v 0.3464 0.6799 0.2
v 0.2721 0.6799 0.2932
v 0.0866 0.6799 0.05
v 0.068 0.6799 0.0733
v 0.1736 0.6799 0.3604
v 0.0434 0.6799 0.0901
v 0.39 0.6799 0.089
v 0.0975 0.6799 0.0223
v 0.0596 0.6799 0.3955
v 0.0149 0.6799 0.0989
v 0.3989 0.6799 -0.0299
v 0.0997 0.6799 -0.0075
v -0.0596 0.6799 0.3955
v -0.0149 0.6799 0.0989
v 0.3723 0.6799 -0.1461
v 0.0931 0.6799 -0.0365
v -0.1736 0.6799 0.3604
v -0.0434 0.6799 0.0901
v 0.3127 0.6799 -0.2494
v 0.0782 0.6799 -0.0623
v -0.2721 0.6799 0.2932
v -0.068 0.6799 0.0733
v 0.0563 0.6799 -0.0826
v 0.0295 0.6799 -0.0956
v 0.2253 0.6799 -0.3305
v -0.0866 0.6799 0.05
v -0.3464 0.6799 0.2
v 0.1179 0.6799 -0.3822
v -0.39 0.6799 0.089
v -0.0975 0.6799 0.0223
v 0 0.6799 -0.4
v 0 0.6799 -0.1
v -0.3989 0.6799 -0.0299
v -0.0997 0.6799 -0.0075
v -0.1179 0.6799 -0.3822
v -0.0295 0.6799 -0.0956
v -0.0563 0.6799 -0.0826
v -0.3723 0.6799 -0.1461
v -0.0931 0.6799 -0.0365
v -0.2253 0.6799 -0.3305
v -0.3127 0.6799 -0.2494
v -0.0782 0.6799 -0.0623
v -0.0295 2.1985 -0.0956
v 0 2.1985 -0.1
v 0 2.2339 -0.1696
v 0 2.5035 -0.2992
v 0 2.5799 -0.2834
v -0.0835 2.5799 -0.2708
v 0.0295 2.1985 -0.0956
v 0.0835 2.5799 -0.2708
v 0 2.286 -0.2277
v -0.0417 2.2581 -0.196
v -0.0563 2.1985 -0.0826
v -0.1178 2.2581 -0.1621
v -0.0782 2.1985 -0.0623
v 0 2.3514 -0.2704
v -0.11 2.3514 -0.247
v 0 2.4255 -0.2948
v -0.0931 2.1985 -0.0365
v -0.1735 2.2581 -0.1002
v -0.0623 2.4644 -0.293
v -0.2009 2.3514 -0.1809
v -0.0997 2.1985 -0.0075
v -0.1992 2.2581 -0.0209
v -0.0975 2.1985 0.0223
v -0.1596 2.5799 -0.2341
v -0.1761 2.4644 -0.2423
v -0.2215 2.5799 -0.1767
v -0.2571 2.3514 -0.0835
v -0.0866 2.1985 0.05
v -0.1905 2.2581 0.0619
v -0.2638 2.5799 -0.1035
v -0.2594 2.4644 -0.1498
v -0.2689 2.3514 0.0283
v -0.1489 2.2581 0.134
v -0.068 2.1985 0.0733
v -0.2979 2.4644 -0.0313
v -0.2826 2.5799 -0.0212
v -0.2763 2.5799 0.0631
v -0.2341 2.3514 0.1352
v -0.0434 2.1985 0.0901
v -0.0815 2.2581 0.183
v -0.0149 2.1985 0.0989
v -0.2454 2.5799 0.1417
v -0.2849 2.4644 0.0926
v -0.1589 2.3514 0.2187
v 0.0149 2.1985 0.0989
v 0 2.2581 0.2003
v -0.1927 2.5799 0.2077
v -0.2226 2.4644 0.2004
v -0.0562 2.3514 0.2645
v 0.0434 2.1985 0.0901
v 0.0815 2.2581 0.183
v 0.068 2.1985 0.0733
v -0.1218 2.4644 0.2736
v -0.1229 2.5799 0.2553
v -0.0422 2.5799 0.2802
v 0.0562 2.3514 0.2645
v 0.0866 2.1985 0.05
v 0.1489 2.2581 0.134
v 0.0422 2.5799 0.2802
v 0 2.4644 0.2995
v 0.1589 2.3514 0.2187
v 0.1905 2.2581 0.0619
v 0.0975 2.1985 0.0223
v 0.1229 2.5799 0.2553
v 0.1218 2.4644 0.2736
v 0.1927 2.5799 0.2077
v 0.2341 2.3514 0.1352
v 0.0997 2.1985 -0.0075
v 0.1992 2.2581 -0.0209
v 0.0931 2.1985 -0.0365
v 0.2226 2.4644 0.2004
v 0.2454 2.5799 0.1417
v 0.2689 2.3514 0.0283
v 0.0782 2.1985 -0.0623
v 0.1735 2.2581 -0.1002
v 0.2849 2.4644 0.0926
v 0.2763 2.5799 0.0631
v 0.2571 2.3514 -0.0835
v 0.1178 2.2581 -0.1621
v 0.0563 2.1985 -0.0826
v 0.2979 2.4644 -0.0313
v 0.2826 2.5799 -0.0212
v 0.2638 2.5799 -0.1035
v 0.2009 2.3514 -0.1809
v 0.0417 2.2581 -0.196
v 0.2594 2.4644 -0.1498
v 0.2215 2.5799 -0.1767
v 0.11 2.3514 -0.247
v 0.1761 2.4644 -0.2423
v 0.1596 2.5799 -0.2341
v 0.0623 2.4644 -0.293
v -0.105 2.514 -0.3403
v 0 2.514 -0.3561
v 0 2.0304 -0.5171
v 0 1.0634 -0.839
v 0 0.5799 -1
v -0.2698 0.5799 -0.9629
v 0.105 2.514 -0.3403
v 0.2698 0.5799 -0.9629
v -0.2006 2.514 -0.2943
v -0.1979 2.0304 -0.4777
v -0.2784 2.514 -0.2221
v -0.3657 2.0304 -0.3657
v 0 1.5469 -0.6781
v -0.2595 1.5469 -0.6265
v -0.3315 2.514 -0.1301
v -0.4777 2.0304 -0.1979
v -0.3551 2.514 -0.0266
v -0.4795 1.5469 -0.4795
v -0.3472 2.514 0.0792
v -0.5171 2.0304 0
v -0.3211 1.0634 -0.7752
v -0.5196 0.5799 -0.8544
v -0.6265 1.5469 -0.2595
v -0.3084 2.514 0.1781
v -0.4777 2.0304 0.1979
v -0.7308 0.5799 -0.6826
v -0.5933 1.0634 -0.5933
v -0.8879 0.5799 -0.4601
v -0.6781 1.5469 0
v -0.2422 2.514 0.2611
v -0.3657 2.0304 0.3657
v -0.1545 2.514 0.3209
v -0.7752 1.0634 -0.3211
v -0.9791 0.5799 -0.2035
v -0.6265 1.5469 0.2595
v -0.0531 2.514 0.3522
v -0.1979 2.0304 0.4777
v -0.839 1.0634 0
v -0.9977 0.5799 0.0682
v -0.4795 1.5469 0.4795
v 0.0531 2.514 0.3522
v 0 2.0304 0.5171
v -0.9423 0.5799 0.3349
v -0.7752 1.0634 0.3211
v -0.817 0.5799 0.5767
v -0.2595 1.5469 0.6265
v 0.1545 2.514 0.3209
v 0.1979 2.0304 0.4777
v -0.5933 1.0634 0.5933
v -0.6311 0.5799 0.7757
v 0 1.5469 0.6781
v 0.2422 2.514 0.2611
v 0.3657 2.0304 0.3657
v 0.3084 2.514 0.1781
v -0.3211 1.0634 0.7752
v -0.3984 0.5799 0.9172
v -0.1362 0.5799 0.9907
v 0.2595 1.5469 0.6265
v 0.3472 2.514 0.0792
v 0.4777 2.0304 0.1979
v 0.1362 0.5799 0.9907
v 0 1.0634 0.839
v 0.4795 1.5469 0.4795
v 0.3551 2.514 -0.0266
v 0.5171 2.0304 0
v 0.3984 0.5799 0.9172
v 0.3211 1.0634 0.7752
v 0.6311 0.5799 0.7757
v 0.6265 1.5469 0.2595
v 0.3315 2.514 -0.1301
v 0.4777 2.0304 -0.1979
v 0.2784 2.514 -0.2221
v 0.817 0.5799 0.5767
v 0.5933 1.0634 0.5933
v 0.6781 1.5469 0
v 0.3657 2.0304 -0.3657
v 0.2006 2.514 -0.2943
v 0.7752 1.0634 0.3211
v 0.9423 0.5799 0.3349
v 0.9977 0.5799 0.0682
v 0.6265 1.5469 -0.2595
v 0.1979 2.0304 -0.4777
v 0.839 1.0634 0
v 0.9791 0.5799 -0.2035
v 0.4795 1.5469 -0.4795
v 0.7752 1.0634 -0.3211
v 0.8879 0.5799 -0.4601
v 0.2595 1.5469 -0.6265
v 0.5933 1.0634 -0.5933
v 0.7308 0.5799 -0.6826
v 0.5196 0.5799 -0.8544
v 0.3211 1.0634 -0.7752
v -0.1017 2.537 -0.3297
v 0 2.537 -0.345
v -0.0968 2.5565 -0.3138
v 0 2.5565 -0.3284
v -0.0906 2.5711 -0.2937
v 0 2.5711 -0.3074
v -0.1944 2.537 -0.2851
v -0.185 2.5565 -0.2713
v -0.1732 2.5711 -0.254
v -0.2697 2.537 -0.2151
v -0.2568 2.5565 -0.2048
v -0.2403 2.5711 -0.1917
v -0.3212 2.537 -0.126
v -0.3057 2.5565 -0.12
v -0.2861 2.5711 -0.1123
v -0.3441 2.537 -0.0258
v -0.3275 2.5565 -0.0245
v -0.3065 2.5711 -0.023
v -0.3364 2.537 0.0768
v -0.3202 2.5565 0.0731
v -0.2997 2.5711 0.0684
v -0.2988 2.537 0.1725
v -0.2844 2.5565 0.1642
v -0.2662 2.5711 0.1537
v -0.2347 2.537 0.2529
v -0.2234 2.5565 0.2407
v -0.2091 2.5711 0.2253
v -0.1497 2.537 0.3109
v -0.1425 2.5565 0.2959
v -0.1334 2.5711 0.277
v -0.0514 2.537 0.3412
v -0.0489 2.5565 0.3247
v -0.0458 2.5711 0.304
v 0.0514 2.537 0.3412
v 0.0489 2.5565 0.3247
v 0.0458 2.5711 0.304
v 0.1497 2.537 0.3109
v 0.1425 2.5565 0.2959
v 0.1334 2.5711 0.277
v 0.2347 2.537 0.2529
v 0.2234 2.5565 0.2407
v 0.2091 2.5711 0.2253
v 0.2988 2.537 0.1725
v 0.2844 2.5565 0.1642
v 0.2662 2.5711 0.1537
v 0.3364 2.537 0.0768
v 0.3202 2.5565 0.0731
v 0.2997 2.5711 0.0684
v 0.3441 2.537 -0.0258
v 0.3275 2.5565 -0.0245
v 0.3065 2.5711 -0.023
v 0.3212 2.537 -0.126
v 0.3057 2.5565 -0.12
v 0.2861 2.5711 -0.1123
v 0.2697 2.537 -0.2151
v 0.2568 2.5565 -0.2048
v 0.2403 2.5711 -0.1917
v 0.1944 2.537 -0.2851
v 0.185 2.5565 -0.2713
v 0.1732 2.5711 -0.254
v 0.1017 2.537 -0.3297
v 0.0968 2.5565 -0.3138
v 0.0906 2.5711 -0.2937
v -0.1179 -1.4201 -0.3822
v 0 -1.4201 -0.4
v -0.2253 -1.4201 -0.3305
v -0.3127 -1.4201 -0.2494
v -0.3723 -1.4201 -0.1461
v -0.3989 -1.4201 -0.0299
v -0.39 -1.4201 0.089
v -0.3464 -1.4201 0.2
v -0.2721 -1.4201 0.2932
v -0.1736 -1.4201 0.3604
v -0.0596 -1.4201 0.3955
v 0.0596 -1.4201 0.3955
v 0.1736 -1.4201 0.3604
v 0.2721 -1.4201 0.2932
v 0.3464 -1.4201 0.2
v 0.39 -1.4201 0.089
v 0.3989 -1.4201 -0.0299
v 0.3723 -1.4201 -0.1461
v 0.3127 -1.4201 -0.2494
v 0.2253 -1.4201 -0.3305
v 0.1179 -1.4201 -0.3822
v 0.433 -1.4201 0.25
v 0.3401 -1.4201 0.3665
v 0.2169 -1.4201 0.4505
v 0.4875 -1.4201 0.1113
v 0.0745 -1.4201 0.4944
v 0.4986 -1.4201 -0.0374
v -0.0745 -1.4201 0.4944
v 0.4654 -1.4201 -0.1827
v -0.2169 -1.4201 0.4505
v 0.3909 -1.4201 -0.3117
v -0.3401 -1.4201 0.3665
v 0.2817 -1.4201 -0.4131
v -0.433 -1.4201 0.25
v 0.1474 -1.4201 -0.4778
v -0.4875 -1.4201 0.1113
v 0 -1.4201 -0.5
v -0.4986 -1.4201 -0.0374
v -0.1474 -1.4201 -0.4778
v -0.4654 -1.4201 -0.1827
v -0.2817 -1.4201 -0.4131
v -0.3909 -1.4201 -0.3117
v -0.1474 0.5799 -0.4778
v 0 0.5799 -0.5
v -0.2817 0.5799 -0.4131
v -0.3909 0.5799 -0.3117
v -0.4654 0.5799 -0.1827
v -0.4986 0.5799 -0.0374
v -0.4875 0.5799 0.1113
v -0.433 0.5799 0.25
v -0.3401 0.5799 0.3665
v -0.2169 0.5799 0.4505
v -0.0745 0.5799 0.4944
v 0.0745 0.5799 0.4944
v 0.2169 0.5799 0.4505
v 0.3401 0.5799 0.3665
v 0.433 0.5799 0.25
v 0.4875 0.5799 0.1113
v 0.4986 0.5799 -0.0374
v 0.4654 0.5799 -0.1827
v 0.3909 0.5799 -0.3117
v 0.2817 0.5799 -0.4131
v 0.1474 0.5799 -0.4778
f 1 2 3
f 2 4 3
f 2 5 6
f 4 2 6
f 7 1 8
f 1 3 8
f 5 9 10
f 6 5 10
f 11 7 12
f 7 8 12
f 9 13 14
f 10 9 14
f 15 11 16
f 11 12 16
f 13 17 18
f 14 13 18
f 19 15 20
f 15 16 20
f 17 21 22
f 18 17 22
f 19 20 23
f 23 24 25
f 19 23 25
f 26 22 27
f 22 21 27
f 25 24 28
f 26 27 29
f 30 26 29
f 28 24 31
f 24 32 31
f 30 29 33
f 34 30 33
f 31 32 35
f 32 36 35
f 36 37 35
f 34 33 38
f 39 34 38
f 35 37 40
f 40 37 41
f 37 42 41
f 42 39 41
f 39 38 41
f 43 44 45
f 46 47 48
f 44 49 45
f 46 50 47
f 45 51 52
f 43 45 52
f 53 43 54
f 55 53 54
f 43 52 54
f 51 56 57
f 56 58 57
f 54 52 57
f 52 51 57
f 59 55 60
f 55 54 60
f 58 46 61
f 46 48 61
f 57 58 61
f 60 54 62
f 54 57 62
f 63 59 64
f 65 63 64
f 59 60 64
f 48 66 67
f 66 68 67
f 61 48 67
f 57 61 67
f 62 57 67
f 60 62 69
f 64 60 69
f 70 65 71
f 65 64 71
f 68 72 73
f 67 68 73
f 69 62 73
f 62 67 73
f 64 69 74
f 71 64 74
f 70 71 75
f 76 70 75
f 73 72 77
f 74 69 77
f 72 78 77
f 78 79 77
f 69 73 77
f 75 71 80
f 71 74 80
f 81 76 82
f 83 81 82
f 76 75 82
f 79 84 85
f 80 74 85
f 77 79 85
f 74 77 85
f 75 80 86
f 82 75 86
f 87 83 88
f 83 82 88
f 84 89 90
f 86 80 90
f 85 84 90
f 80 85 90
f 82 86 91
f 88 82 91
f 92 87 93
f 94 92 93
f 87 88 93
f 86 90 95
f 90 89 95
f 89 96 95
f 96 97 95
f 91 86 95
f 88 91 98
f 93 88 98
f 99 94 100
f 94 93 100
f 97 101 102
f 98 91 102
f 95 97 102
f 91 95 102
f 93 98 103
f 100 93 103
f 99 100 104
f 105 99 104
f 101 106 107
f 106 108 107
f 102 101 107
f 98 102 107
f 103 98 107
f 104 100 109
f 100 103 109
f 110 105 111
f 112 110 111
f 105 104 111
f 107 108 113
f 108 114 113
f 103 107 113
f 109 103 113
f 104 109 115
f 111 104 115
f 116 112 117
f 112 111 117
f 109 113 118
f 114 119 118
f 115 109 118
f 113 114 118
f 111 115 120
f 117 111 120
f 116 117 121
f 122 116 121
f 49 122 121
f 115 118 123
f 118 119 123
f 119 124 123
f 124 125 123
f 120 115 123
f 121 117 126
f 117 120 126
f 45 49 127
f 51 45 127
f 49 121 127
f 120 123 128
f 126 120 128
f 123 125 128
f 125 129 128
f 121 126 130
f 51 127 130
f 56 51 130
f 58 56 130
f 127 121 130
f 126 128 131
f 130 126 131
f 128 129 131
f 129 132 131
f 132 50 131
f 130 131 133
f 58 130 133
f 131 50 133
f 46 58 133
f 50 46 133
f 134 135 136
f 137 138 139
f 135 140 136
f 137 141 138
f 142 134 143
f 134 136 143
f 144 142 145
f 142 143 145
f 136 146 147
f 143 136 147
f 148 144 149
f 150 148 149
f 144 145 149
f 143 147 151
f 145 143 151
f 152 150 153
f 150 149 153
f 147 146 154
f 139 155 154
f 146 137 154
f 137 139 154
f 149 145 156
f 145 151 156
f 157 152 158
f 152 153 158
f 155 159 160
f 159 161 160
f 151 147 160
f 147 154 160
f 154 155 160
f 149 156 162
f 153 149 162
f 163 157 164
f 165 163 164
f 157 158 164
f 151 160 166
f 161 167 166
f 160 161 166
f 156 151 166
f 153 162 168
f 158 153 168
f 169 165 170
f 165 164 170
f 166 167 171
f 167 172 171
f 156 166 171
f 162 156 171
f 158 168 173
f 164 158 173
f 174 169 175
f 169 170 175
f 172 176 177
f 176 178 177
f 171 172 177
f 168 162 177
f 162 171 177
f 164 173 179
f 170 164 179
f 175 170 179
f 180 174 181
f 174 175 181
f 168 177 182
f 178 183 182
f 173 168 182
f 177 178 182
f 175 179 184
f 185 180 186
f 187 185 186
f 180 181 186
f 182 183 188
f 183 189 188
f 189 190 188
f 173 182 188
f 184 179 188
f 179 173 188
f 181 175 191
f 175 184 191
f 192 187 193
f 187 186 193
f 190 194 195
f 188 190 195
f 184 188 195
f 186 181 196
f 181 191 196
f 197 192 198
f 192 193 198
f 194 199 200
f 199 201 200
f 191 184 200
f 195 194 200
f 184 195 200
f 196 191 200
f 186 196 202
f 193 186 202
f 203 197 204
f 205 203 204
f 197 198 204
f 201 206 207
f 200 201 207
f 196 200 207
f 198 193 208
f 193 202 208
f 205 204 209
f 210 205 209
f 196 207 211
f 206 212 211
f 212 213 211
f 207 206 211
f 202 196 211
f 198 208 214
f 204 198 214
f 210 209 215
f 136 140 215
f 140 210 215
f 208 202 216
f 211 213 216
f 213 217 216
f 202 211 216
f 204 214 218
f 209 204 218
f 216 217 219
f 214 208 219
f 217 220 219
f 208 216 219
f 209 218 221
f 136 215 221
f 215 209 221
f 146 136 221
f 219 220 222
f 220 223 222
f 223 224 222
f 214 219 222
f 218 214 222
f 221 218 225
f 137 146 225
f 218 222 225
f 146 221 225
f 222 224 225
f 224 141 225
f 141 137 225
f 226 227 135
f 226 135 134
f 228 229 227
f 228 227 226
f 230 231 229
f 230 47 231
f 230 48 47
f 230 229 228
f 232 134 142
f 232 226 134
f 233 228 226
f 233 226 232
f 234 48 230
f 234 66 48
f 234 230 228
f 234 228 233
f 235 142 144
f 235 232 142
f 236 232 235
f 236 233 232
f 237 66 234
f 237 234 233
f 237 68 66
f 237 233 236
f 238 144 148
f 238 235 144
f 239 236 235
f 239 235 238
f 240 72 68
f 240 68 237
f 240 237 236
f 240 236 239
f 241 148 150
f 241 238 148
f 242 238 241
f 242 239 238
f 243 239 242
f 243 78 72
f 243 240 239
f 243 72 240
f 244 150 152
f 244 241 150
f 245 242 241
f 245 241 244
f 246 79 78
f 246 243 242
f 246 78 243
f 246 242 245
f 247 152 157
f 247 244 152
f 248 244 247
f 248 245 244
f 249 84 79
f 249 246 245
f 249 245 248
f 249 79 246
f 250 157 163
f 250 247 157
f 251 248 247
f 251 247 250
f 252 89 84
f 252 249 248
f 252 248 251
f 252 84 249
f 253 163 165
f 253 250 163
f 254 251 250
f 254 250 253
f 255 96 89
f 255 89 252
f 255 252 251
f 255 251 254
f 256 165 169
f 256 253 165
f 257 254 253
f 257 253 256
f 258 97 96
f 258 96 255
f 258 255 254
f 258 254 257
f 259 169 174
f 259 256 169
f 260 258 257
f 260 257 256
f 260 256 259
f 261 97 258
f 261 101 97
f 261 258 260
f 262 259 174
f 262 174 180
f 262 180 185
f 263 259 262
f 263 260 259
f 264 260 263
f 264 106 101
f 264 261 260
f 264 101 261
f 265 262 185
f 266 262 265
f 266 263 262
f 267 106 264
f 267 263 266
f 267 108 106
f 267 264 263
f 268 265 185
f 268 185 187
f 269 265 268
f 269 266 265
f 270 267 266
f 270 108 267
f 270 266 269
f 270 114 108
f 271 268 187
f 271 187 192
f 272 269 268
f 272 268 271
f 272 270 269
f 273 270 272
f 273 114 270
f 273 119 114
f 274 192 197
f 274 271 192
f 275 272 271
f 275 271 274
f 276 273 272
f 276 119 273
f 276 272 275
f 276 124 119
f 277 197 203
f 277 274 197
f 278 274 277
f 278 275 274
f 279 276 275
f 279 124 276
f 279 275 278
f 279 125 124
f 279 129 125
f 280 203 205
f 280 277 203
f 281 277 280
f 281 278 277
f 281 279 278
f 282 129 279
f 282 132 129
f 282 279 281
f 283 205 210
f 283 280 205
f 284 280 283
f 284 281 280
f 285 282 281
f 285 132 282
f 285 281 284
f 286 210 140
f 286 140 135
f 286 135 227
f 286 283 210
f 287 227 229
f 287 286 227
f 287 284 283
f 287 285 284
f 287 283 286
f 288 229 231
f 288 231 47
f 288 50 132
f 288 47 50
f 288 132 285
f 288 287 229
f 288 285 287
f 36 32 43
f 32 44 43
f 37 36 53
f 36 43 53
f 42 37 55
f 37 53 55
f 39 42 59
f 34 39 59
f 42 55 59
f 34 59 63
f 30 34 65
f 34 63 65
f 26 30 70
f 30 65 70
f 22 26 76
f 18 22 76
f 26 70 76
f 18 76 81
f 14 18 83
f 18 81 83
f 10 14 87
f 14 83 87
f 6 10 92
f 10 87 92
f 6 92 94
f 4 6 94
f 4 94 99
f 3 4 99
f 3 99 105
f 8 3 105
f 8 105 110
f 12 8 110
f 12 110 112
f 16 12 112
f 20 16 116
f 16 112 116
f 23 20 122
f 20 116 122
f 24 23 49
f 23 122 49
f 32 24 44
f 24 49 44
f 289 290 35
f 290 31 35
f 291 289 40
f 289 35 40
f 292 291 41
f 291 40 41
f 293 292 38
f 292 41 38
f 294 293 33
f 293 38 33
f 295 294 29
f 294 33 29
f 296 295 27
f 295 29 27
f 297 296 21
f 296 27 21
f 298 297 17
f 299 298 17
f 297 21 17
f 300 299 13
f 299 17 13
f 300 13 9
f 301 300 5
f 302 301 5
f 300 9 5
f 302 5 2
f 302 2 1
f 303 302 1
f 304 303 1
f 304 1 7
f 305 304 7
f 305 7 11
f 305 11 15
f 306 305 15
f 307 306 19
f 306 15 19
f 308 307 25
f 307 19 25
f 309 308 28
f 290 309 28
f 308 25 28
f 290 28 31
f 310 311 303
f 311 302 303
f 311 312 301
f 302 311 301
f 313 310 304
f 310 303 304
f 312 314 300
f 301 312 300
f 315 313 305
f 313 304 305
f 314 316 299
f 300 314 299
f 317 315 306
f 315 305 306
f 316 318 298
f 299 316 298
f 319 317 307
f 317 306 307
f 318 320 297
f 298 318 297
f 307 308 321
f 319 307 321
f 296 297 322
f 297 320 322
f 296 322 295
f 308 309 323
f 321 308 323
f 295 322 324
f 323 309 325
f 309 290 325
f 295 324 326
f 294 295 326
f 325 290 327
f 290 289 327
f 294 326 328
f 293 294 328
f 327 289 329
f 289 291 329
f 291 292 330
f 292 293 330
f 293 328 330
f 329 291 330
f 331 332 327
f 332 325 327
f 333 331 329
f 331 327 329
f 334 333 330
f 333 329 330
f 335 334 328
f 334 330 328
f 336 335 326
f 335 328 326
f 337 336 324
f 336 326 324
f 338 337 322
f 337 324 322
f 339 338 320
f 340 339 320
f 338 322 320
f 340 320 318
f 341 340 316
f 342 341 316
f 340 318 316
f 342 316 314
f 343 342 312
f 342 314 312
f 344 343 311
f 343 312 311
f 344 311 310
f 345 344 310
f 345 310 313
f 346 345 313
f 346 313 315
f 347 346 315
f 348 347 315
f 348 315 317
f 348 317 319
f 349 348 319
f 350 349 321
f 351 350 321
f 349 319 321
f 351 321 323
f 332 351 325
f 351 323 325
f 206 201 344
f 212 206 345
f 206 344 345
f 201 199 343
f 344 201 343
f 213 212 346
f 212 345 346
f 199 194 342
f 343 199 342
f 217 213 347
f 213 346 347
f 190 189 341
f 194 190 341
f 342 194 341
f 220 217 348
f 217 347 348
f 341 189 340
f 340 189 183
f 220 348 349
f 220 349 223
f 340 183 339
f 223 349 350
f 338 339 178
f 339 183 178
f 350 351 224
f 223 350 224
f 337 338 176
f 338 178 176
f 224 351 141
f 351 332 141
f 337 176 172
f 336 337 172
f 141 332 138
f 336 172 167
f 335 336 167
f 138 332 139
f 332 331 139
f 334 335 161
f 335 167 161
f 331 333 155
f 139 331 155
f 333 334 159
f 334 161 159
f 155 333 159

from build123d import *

# Parameters (mm, degrees)
REDONDEO1_R = 0.1


with BuildPart() as part:
    # Croquis1 → Revolución1 (revolve)
    with BuildSketch(Plane.XY, mode=Mode.PRIVATE) as revoluci_n1_sk:
        with BuildLine():
            Line((0.39999999999987756, -1.4200968373354317), (0.39999999999987756, 0.6799031626646908))
            Line((0.39999999999987756, 0.6799031626646908), (0.09999999999987759, 0.6799031626646908))
            Line((0.09999999999987759, 0.6799031626646908), (0.09999999999987759, 2.1985465652935696))
            ThreePointArc((0.09999999999987759, 2.1985465652935696), (0.2703704027459185, 2.3513898726964784), (0.28336374941518433, 2.5799031626645688))
            Line((0.28336374941518433, 2.5799031626645688), (0.33419321065036695, 2.5799031626645688))
            Line((0.33419321065036695, 2.5799031626645688), (1, 0.5799031626645683))
            Line((1, 0.5799031626645683), (0.5, 0.5799031626645683))
            Line((0.5, 0.5799031626645683), (0.5, -1.4200968373354317))
            Line((0.5, -1.4200968373354317), (0.39999999999987756, -1.4200968373354317))
        make_face()
    revolve(revoluci_n1_sk.sketch.rotate(Axis((0, -1000, 0), (0, 1, 0)), 90), axis=Axis((0, -1000, 0), (0, 1, 0)))

    # Redondeo1
    # the kernel refuses this fillet: 0.1 mm, written as the material it takes off along each edge
    with BuildSketch(Plane(origin=(0, 2.57990316266455, 0), x_dir=(1.1e-16, 0, -1), z_dir=(1, 0, 1.1e-16))) as redondeo1_piece_1:
        with BuildLine():
            CenterArc((0.26126482017864594, -0.09752762340280041), REDONDEO1_R, 18.412775660574653, 58.82007881001293)
            Line((0.28336374941518433, 0), (0.2838057279999151, 0.00195055246805609))
            ThreePointArc((0.2838057279999151, 0.00195055246805609), (0.30877848003277564, 0.00199999999999978), (0.33419321065036695, 0.00199999999999978))
            Line((0.33419321065036695, 0.00199999999999978), (0.33609082186131406, 0.00063172121389732))
            Line((0.33609082186131406, 0.00063172121389732), (0.3580429919369484, -0.06530984149403896))
            Line((0.3580429919369484, -0.06530984149403896), (0.35614538072600127, -0.06594156270793627))
        make_face()
    revolve(axis=Axis((0, 2.57990316266455, 0), (0, 1, 0)), mode=Mode.SUBTRACT)


solid = part.part
